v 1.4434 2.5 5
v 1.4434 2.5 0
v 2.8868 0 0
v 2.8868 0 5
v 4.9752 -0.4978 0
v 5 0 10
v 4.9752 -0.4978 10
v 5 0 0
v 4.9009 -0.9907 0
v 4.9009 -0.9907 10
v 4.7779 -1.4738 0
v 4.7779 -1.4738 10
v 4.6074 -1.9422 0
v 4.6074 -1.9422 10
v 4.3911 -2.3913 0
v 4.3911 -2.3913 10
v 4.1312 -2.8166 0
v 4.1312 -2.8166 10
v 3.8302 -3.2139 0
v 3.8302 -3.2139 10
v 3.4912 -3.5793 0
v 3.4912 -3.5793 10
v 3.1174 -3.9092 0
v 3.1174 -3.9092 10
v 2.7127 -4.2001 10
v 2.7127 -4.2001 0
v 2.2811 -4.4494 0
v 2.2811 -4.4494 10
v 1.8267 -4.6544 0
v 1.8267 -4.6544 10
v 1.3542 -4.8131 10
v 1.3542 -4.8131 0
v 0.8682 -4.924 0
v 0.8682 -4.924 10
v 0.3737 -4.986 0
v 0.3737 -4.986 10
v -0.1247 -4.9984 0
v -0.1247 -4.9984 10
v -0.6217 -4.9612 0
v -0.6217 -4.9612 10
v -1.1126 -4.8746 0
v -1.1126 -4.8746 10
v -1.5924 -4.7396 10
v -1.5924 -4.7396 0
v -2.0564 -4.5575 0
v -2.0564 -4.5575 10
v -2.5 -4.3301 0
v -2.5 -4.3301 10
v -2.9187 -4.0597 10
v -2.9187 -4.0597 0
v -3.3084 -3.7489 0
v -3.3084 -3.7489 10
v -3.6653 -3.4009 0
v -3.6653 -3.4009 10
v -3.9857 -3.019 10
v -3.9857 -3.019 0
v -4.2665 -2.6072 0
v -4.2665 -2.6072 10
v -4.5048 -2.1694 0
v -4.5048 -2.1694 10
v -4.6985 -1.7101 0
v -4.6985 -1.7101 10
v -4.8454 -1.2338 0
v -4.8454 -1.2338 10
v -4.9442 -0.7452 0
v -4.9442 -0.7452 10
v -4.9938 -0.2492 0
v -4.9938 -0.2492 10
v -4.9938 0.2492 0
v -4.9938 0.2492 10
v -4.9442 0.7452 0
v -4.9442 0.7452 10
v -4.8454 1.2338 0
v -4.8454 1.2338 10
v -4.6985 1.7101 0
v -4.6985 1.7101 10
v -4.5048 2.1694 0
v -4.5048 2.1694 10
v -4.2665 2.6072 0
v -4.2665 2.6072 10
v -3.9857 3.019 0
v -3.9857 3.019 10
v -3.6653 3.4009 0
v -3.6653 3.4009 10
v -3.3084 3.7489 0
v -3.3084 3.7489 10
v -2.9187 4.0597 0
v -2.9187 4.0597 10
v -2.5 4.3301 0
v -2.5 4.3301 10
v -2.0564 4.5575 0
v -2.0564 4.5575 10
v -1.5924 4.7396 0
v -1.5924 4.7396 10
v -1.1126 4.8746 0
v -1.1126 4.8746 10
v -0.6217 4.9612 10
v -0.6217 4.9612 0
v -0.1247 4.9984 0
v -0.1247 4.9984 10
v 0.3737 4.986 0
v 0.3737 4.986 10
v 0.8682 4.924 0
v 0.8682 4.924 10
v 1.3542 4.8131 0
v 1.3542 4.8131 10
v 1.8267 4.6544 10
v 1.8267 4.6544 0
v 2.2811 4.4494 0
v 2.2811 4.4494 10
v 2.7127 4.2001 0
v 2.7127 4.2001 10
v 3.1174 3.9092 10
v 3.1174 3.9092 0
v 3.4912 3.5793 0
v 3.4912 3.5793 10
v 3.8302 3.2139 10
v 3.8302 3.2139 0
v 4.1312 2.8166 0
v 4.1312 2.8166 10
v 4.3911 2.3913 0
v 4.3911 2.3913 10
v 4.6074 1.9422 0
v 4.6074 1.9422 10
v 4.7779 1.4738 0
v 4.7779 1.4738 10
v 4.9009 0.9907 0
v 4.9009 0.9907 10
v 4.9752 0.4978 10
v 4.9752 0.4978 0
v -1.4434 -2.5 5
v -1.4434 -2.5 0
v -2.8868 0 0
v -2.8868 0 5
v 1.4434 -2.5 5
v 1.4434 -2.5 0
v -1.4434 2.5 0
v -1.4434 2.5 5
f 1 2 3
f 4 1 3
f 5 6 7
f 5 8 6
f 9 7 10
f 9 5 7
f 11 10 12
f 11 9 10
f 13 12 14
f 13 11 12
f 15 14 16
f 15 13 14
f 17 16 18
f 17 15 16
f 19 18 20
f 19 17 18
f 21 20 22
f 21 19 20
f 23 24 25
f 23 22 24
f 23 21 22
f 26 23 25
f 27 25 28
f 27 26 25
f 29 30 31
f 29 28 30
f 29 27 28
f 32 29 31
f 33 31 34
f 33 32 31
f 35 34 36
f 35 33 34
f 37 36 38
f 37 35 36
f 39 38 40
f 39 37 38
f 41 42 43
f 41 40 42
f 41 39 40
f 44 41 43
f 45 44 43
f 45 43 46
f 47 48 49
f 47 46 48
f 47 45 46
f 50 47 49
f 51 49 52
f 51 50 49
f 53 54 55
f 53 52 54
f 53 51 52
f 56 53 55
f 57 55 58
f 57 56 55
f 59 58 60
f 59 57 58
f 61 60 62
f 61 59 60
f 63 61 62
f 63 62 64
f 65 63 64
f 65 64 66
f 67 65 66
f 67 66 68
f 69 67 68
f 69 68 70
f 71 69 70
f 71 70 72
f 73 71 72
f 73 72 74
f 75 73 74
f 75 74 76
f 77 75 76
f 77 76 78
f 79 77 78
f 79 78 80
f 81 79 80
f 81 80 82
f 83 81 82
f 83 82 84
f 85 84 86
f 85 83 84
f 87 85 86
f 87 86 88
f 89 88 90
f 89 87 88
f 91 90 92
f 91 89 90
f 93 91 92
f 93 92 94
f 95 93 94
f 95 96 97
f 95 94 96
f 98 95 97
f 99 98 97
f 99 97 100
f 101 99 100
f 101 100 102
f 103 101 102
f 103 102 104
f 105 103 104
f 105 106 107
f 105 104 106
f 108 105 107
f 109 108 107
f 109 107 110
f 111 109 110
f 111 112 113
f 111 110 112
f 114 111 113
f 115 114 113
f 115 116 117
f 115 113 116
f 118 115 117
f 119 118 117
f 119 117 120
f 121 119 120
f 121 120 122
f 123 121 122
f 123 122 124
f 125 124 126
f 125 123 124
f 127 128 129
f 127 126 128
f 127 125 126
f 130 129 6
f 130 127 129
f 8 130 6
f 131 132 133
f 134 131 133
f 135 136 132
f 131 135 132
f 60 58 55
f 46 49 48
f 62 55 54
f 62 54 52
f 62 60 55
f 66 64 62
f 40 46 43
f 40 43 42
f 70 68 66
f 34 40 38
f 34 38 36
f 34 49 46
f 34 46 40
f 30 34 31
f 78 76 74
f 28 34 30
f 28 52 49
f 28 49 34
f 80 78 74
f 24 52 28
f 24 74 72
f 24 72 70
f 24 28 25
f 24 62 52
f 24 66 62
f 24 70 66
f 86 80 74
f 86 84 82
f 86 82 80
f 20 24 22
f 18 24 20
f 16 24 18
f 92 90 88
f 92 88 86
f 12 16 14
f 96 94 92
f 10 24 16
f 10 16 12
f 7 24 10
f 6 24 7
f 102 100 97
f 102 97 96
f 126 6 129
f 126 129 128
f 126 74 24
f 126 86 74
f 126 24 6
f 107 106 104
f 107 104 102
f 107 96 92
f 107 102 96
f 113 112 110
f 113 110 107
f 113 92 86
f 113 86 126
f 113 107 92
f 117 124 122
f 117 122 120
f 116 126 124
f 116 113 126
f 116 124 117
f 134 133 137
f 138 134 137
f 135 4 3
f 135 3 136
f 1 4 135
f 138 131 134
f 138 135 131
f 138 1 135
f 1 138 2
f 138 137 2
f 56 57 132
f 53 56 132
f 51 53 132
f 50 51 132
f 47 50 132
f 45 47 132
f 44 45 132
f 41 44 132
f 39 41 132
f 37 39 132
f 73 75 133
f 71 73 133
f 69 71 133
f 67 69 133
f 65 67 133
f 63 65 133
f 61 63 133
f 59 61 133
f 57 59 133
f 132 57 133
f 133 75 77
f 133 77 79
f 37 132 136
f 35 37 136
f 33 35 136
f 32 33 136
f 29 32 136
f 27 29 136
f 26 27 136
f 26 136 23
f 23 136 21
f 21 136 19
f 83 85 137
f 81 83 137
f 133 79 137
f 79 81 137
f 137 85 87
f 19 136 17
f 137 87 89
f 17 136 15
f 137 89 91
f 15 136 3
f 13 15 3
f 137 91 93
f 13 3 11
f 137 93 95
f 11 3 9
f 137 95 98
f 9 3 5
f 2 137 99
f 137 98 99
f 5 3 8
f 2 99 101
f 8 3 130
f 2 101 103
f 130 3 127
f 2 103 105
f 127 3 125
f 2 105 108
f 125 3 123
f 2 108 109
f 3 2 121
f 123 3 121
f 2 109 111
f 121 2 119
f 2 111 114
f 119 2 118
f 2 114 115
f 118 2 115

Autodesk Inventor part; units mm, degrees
ref_plane "YZ Plane" through (0, 0, 0) normal (1, 0, 0) x (0, 1, 0)
ref_plane "XZ Plane" through (0, 0, 0) normal (0, 1, 0) x (-1, 0, 0)
ref_plane "XY Plane" through (0, 0, 0) normal (0, 0, 1) x (1, 0, 0)
sketch "Sketch1" plane through (0, 0, 0) normal (0, 0, 1) x (1, 0, 0)
  circle A0 centre (0, 0) radius 5
  dimension "d0" = 10
extrude "Extrusion1" add sketch "Sketch1" along normal blind 10
thread "Thread1" size "M10x1.5" class "6g" standard "ANSI Metric M Profile" full length
sketch "Sketch2" plane through (0, 0, 0) normal (0, 0, -1) x (-1, 0, 0)
  circle A0 centre (0, 0) radius 5 projected
  circle A1 centre (0, 0) radius 2.5
  line L0 (-1.8795, -2.5) -> (1.9053, -2.5)
  line L1 (1.2253, -2.8777) -> (3.1177, 0.4)
  line L2 (3.1048, -0.3777) -> (1.2124, 2.9)
  line L3 (1.8795, 2.5) -> (-1.9053, 2.5)
  line L4 (-1.2253, 2.8777) -> (-3.1177, -0.4)
  line L5 (-3.1048, 0.3777) -> (-1.2124, -2.9)
  line L6 (-1.4434, 2.5) -> (1.4434, 2.5)
  line L7 (1.4434, 2.5) -> (2.8868, 0)
  line L8 (2.8868, 0) -> (1.4434, -2.5)
  line L9 (1.4434, -2.5) -> (-1.4434, -2.5)
  line L10 (-1.4434, -2.5) -> (-2.8868, 0)
  line L11 (-2.8868, 0) -> (-1.4434, 2.5)
  dimension "d5" = 5
  dimension "d8" = 360
extrude "Extrusion2" cut sketch "Sketch2" against normal blind 5 contours A1 | A1 L2 L1 | A1 L3 L2 | L1 L0 A1 | A1 L4 L3 | L0 L5 A1 | A1 L5 L4
properties part number "Pusher.Socketscrew"
